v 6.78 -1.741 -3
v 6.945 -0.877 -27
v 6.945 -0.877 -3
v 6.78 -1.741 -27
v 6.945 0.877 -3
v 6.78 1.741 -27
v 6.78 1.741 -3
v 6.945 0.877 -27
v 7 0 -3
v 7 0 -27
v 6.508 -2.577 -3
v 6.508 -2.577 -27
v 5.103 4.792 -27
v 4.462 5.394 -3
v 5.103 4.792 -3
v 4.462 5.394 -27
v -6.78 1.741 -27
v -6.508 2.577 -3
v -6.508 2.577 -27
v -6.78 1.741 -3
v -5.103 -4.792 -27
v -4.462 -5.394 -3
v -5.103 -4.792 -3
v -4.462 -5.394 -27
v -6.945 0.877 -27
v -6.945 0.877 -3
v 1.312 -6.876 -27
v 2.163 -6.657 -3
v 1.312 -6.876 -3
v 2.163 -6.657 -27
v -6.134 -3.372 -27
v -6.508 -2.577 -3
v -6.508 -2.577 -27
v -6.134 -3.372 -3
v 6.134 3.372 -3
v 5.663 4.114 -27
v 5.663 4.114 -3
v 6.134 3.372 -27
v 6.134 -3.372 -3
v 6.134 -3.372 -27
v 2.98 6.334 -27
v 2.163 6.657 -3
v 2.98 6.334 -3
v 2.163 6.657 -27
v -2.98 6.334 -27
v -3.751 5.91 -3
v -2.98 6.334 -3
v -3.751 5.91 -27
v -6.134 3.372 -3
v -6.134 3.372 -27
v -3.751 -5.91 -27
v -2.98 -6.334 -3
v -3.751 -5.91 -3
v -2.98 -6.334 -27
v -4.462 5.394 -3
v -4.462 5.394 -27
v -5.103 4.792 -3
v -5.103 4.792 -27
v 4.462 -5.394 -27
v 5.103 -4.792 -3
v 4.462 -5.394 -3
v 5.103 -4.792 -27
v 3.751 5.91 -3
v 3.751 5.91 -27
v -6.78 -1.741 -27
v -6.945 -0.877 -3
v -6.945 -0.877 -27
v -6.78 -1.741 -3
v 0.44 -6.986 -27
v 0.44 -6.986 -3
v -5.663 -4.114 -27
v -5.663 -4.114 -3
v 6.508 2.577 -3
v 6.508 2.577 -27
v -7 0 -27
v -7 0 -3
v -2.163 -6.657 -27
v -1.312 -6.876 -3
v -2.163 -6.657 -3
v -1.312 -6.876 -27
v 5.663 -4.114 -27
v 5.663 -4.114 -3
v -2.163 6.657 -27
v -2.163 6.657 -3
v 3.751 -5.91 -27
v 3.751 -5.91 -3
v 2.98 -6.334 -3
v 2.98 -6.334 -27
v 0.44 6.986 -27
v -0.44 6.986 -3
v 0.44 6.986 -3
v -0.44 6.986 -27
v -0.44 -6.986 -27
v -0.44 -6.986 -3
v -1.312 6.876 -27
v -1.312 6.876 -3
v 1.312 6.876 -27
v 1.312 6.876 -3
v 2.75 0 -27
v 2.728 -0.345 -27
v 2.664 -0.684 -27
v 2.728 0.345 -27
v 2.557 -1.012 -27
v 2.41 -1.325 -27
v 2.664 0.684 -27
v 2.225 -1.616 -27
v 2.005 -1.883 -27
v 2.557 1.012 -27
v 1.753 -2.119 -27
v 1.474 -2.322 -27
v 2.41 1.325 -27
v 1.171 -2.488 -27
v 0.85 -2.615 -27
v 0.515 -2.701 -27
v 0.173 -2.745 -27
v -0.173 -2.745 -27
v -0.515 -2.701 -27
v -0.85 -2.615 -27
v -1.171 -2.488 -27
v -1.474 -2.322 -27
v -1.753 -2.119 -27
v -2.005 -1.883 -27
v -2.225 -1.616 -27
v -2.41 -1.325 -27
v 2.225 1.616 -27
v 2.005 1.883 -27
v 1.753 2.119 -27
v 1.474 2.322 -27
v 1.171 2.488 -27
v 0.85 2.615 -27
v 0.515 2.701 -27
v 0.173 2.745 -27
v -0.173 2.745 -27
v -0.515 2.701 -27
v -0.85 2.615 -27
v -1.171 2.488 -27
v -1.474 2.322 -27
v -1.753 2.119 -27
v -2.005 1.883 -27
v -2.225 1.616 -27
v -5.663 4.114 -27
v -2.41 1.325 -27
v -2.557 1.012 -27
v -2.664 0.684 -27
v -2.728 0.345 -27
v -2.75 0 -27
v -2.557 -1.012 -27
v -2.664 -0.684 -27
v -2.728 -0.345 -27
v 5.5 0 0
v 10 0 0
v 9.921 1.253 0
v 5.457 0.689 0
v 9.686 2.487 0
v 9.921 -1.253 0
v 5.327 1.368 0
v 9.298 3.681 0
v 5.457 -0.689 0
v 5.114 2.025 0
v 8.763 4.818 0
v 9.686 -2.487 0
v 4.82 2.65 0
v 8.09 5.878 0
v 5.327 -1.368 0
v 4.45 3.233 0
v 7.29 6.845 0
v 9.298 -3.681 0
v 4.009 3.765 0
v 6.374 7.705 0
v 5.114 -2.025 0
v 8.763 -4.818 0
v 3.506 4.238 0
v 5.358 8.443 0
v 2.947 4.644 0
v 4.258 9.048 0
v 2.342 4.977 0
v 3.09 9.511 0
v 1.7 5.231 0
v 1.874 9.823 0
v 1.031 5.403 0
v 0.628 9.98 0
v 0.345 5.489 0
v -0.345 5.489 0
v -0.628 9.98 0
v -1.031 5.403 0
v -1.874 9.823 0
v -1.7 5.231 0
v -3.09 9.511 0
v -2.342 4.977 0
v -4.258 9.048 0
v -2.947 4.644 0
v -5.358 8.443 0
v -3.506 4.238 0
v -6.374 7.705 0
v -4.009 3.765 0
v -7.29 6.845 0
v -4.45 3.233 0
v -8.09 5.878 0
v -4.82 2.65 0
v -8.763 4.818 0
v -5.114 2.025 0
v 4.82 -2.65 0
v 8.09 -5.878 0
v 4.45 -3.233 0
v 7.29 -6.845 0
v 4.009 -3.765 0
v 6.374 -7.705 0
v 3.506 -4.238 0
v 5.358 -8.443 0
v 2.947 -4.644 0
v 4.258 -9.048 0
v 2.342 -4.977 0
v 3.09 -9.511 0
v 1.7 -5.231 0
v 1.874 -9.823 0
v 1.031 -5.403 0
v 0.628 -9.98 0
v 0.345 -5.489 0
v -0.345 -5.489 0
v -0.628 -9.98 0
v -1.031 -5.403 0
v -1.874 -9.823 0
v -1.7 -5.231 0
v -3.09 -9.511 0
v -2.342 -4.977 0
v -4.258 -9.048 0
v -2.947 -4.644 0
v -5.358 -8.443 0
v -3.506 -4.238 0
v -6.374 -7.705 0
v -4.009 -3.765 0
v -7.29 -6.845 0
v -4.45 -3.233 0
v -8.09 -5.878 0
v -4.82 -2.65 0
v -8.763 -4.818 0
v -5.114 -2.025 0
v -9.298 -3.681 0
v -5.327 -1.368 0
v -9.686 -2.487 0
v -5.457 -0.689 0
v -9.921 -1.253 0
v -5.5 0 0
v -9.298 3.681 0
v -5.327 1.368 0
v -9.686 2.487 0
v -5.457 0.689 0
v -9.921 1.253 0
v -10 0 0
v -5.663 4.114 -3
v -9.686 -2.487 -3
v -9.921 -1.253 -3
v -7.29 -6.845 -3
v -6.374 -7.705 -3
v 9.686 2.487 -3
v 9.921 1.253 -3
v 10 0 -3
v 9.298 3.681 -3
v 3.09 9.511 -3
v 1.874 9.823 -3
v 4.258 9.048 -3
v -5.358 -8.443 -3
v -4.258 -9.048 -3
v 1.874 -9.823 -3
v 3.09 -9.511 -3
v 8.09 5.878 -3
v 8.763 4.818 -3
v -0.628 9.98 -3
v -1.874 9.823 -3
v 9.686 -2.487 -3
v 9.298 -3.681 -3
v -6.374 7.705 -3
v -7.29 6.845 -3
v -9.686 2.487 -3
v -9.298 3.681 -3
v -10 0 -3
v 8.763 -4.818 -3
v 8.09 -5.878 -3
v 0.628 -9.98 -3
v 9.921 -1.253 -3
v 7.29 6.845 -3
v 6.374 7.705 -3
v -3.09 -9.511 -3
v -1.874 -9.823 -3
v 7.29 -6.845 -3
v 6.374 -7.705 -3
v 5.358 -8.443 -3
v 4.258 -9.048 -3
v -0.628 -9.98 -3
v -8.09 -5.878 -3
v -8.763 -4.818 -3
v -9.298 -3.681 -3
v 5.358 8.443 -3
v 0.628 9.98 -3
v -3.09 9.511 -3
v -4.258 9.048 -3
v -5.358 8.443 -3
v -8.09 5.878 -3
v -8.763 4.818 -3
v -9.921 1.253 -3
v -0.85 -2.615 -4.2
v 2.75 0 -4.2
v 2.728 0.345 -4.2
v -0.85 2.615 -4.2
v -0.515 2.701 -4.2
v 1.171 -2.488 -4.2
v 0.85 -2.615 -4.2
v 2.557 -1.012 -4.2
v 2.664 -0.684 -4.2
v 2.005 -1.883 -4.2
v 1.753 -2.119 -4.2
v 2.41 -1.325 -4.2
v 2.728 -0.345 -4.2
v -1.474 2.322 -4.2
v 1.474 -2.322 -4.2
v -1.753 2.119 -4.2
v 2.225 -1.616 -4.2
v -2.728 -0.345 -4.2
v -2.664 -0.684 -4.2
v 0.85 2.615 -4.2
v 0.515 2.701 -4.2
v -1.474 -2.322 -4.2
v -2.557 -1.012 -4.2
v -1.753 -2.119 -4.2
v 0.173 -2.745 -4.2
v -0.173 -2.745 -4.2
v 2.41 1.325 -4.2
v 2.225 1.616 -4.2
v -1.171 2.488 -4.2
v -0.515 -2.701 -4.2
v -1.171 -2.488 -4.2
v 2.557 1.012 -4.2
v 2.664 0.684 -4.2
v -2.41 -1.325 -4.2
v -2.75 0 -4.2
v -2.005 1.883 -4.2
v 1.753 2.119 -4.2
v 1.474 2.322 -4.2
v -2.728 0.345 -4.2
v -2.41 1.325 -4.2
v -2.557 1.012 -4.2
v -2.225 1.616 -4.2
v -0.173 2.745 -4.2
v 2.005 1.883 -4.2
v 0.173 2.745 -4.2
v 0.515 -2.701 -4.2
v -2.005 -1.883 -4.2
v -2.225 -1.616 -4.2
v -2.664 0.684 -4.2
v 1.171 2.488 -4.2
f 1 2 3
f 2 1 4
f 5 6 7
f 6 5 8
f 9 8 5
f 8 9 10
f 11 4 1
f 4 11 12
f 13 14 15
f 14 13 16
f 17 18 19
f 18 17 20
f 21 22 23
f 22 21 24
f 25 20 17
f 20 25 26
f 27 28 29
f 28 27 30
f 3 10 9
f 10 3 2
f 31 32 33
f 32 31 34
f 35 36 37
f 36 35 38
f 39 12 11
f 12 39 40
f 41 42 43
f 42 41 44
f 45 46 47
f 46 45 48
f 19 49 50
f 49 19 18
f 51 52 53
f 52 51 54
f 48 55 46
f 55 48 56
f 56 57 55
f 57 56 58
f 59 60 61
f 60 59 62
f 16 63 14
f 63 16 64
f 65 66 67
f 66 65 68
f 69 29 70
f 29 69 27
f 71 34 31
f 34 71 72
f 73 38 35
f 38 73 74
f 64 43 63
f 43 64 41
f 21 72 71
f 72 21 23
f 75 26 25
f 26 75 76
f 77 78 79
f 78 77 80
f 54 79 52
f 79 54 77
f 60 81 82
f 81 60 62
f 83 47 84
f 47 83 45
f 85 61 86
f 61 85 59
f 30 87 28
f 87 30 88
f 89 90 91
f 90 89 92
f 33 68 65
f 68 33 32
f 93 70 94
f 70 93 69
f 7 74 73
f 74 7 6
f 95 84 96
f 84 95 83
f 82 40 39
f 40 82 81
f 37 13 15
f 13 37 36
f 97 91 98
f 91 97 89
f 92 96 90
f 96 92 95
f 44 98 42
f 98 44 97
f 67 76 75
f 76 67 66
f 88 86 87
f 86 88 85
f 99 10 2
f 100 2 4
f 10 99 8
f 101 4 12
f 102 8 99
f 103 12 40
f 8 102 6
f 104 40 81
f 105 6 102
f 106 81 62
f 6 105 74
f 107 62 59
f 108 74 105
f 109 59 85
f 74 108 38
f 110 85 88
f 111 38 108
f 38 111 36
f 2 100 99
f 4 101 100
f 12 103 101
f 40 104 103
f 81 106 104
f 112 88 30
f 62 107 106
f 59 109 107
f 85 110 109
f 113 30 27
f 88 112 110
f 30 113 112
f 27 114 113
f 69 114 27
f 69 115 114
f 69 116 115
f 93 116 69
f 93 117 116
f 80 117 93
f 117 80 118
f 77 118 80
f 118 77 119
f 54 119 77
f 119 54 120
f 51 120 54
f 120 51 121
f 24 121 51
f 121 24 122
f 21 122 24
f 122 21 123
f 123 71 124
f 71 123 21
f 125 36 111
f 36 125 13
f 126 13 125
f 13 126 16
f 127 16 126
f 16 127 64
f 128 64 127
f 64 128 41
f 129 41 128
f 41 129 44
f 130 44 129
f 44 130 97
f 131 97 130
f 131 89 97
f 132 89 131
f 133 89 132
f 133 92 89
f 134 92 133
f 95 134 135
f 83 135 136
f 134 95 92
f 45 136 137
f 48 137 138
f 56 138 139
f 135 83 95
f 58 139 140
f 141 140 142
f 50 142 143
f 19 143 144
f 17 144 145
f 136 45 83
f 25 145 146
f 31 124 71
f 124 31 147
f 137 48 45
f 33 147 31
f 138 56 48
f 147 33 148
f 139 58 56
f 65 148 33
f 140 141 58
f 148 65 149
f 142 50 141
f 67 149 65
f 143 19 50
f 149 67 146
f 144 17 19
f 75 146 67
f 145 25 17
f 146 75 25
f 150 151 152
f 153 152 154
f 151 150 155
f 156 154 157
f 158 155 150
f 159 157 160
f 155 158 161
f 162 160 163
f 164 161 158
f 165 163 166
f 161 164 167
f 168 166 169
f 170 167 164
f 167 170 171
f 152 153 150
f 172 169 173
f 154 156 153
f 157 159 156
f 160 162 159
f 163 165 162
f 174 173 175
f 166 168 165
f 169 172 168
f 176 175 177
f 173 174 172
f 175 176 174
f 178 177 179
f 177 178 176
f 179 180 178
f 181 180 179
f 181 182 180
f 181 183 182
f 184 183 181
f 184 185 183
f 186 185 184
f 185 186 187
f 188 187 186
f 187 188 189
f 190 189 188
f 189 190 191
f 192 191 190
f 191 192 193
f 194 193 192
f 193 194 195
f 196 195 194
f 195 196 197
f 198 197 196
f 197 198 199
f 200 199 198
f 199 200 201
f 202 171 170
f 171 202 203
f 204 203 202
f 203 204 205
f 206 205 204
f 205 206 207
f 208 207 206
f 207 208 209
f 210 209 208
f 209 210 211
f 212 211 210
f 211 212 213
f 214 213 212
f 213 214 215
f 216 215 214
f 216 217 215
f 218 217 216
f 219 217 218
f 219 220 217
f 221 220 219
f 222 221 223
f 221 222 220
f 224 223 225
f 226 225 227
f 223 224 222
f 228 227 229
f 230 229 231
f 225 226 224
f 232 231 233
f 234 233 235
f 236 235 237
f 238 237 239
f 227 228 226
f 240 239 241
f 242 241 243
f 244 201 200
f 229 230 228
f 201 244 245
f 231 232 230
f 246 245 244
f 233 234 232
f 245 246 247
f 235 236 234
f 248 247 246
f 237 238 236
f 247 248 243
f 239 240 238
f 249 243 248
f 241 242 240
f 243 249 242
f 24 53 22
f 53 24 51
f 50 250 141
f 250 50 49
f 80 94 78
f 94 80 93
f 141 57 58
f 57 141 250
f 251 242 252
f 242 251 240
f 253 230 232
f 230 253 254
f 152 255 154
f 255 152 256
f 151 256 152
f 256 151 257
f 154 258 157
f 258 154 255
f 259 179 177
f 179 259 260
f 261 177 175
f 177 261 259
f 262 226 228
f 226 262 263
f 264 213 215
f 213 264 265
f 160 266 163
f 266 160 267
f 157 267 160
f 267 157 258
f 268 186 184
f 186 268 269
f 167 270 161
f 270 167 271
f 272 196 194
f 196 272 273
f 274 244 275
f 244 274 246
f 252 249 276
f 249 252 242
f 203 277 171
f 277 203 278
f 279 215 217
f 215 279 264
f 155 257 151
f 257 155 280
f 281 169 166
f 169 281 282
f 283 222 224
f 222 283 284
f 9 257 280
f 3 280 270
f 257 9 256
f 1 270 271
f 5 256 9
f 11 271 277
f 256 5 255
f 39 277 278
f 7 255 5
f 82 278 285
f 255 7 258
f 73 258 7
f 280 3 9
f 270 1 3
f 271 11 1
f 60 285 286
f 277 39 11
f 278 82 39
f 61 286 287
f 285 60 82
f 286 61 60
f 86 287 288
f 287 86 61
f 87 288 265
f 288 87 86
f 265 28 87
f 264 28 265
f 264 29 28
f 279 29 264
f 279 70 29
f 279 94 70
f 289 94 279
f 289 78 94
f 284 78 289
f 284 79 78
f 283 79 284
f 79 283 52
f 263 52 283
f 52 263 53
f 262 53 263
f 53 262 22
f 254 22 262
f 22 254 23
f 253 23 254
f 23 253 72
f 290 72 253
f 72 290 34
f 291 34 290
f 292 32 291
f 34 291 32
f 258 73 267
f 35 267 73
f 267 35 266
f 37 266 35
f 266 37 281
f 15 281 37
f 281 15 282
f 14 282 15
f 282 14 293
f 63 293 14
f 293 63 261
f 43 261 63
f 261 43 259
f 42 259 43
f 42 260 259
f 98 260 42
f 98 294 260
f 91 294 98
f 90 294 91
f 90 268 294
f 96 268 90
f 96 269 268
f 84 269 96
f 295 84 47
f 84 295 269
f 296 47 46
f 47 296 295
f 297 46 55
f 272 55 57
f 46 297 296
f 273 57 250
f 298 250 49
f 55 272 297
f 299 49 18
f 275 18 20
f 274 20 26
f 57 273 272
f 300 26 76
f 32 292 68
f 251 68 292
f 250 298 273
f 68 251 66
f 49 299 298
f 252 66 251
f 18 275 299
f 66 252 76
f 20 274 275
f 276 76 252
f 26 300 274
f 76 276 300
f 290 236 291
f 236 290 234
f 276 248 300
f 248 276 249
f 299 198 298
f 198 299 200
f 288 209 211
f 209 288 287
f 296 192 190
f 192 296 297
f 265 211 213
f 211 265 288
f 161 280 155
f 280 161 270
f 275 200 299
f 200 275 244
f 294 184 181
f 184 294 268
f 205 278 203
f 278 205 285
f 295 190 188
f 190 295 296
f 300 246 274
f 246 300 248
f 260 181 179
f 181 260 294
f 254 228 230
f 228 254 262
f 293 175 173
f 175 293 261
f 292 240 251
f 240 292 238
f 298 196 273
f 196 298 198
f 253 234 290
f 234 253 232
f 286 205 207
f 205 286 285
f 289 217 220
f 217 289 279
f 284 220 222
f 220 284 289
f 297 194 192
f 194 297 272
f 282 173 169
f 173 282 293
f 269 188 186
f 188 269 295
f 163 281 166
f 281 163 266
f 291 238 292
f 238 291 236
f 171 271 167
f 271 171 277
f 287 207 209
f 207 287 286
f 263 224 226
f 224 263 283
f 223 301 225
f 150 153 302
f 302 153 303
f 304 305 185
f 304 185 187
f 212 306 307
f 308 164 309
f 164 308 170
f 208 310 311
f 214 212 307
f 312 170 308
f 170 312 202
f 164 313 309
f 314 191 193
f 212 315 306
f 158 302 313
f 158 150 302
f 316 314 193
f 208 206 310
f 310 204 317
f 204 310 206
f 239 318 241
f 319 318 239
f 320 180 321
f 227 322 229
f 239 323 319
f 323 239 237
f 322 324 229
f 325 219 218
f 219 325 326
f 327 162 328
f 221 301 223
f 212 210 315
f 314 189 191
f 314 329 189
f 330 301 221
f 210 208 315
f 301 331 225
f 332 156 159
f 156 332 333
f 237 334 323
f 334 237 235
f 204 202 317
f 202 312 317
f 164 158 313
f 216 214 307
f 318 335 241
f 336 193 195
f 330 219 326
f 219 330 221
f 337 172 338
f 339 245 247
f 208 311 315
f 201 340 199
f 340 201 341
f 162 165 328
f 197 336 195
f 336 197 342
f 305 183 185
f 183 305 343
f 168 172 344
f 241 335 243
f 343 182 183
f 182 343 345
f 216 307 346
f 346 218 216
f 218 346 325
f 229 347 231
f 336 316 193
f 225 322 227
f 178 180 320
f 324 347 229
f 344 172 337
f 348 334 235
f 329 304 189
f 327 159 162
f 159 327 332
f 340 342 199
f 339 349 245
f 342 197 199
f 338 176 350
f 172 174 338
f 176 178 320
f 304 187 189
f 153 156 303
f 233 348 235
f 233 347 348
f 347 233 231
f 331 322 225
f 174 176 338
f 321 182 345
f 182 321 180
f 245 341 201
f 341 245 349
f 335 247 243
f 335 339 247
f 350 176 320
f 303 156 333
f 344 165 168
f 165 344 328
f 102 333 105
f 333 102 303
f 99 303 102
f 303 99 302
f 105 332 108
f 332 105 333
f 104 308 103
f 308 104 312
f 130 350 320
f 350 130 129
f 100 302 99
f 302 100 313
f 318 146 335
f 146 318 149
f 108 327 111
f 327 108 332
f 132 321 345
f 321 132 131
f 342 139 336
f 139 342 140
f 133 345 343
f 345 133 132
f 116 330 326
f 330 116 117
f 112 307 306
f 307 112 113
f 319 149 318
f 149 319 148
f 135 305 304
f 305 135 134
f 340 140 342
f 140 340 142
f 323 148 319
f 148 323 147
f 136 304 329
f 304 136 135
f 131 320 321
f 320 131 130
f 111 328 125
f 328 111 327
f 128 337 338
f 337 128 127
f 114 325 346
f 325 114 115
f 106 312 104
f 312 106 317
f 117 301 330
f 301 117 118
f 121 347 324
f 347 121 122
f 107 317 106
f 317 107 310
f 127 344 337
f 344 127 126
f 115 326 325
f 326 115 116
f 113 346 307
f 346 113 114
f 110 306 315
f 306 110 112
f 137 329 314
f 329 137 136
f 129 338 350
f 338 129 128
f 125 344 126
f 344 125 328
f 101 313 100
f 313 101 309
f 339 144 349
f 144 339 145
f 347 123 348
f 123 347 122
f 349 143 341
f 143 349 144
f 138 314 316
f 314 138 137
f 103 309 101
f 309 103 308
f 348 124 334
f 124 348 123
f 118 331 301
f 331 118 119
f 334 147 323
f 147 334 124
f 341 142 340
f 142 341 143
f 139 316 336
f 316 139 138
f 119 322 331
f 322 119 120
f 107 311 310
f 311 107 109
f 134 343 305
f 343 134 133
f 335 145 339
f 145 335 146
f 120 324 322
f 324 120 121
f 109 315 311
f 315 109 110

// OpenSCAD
$fn = 50;


difference() {
	union() {
		translate(v = [0, 0, -27.0000000000]) {
			cylinder(h = 27, r = 7.0000000000);
		}
		translate(v = [0, 0, -3.0000000000]) {
			cylinder(h = 3, r = 10.0000000000);
		}
	}
	union() {
		translate(v = [0, 0, 0]) {
			rotate(a = [0, 0, 0]) {
				difference() {
					union() {
						#translate(v = [0, 0, -27.0000000000]) {
							cylinder(h = 27, r = 2.2500000000);
						}
						#translate(v = [0, 0, -4.2000000000]) {
							cylinder(h = 4.2000000000, r = 7.0000000000, r1 = 2.7500000000, r2 = 5.5000000000);
						}
						#translate(v = [0, 0, -27.0000000000]) {
							cylinder(h = 27, r = 2.7500000000);
						}
						#translate(v = [0, 0, -27.0000000000]) {
							cylinder(h = 27, r = 2.2500000000);
						}
					}
					union();
				}
			}
		}
	}
}
